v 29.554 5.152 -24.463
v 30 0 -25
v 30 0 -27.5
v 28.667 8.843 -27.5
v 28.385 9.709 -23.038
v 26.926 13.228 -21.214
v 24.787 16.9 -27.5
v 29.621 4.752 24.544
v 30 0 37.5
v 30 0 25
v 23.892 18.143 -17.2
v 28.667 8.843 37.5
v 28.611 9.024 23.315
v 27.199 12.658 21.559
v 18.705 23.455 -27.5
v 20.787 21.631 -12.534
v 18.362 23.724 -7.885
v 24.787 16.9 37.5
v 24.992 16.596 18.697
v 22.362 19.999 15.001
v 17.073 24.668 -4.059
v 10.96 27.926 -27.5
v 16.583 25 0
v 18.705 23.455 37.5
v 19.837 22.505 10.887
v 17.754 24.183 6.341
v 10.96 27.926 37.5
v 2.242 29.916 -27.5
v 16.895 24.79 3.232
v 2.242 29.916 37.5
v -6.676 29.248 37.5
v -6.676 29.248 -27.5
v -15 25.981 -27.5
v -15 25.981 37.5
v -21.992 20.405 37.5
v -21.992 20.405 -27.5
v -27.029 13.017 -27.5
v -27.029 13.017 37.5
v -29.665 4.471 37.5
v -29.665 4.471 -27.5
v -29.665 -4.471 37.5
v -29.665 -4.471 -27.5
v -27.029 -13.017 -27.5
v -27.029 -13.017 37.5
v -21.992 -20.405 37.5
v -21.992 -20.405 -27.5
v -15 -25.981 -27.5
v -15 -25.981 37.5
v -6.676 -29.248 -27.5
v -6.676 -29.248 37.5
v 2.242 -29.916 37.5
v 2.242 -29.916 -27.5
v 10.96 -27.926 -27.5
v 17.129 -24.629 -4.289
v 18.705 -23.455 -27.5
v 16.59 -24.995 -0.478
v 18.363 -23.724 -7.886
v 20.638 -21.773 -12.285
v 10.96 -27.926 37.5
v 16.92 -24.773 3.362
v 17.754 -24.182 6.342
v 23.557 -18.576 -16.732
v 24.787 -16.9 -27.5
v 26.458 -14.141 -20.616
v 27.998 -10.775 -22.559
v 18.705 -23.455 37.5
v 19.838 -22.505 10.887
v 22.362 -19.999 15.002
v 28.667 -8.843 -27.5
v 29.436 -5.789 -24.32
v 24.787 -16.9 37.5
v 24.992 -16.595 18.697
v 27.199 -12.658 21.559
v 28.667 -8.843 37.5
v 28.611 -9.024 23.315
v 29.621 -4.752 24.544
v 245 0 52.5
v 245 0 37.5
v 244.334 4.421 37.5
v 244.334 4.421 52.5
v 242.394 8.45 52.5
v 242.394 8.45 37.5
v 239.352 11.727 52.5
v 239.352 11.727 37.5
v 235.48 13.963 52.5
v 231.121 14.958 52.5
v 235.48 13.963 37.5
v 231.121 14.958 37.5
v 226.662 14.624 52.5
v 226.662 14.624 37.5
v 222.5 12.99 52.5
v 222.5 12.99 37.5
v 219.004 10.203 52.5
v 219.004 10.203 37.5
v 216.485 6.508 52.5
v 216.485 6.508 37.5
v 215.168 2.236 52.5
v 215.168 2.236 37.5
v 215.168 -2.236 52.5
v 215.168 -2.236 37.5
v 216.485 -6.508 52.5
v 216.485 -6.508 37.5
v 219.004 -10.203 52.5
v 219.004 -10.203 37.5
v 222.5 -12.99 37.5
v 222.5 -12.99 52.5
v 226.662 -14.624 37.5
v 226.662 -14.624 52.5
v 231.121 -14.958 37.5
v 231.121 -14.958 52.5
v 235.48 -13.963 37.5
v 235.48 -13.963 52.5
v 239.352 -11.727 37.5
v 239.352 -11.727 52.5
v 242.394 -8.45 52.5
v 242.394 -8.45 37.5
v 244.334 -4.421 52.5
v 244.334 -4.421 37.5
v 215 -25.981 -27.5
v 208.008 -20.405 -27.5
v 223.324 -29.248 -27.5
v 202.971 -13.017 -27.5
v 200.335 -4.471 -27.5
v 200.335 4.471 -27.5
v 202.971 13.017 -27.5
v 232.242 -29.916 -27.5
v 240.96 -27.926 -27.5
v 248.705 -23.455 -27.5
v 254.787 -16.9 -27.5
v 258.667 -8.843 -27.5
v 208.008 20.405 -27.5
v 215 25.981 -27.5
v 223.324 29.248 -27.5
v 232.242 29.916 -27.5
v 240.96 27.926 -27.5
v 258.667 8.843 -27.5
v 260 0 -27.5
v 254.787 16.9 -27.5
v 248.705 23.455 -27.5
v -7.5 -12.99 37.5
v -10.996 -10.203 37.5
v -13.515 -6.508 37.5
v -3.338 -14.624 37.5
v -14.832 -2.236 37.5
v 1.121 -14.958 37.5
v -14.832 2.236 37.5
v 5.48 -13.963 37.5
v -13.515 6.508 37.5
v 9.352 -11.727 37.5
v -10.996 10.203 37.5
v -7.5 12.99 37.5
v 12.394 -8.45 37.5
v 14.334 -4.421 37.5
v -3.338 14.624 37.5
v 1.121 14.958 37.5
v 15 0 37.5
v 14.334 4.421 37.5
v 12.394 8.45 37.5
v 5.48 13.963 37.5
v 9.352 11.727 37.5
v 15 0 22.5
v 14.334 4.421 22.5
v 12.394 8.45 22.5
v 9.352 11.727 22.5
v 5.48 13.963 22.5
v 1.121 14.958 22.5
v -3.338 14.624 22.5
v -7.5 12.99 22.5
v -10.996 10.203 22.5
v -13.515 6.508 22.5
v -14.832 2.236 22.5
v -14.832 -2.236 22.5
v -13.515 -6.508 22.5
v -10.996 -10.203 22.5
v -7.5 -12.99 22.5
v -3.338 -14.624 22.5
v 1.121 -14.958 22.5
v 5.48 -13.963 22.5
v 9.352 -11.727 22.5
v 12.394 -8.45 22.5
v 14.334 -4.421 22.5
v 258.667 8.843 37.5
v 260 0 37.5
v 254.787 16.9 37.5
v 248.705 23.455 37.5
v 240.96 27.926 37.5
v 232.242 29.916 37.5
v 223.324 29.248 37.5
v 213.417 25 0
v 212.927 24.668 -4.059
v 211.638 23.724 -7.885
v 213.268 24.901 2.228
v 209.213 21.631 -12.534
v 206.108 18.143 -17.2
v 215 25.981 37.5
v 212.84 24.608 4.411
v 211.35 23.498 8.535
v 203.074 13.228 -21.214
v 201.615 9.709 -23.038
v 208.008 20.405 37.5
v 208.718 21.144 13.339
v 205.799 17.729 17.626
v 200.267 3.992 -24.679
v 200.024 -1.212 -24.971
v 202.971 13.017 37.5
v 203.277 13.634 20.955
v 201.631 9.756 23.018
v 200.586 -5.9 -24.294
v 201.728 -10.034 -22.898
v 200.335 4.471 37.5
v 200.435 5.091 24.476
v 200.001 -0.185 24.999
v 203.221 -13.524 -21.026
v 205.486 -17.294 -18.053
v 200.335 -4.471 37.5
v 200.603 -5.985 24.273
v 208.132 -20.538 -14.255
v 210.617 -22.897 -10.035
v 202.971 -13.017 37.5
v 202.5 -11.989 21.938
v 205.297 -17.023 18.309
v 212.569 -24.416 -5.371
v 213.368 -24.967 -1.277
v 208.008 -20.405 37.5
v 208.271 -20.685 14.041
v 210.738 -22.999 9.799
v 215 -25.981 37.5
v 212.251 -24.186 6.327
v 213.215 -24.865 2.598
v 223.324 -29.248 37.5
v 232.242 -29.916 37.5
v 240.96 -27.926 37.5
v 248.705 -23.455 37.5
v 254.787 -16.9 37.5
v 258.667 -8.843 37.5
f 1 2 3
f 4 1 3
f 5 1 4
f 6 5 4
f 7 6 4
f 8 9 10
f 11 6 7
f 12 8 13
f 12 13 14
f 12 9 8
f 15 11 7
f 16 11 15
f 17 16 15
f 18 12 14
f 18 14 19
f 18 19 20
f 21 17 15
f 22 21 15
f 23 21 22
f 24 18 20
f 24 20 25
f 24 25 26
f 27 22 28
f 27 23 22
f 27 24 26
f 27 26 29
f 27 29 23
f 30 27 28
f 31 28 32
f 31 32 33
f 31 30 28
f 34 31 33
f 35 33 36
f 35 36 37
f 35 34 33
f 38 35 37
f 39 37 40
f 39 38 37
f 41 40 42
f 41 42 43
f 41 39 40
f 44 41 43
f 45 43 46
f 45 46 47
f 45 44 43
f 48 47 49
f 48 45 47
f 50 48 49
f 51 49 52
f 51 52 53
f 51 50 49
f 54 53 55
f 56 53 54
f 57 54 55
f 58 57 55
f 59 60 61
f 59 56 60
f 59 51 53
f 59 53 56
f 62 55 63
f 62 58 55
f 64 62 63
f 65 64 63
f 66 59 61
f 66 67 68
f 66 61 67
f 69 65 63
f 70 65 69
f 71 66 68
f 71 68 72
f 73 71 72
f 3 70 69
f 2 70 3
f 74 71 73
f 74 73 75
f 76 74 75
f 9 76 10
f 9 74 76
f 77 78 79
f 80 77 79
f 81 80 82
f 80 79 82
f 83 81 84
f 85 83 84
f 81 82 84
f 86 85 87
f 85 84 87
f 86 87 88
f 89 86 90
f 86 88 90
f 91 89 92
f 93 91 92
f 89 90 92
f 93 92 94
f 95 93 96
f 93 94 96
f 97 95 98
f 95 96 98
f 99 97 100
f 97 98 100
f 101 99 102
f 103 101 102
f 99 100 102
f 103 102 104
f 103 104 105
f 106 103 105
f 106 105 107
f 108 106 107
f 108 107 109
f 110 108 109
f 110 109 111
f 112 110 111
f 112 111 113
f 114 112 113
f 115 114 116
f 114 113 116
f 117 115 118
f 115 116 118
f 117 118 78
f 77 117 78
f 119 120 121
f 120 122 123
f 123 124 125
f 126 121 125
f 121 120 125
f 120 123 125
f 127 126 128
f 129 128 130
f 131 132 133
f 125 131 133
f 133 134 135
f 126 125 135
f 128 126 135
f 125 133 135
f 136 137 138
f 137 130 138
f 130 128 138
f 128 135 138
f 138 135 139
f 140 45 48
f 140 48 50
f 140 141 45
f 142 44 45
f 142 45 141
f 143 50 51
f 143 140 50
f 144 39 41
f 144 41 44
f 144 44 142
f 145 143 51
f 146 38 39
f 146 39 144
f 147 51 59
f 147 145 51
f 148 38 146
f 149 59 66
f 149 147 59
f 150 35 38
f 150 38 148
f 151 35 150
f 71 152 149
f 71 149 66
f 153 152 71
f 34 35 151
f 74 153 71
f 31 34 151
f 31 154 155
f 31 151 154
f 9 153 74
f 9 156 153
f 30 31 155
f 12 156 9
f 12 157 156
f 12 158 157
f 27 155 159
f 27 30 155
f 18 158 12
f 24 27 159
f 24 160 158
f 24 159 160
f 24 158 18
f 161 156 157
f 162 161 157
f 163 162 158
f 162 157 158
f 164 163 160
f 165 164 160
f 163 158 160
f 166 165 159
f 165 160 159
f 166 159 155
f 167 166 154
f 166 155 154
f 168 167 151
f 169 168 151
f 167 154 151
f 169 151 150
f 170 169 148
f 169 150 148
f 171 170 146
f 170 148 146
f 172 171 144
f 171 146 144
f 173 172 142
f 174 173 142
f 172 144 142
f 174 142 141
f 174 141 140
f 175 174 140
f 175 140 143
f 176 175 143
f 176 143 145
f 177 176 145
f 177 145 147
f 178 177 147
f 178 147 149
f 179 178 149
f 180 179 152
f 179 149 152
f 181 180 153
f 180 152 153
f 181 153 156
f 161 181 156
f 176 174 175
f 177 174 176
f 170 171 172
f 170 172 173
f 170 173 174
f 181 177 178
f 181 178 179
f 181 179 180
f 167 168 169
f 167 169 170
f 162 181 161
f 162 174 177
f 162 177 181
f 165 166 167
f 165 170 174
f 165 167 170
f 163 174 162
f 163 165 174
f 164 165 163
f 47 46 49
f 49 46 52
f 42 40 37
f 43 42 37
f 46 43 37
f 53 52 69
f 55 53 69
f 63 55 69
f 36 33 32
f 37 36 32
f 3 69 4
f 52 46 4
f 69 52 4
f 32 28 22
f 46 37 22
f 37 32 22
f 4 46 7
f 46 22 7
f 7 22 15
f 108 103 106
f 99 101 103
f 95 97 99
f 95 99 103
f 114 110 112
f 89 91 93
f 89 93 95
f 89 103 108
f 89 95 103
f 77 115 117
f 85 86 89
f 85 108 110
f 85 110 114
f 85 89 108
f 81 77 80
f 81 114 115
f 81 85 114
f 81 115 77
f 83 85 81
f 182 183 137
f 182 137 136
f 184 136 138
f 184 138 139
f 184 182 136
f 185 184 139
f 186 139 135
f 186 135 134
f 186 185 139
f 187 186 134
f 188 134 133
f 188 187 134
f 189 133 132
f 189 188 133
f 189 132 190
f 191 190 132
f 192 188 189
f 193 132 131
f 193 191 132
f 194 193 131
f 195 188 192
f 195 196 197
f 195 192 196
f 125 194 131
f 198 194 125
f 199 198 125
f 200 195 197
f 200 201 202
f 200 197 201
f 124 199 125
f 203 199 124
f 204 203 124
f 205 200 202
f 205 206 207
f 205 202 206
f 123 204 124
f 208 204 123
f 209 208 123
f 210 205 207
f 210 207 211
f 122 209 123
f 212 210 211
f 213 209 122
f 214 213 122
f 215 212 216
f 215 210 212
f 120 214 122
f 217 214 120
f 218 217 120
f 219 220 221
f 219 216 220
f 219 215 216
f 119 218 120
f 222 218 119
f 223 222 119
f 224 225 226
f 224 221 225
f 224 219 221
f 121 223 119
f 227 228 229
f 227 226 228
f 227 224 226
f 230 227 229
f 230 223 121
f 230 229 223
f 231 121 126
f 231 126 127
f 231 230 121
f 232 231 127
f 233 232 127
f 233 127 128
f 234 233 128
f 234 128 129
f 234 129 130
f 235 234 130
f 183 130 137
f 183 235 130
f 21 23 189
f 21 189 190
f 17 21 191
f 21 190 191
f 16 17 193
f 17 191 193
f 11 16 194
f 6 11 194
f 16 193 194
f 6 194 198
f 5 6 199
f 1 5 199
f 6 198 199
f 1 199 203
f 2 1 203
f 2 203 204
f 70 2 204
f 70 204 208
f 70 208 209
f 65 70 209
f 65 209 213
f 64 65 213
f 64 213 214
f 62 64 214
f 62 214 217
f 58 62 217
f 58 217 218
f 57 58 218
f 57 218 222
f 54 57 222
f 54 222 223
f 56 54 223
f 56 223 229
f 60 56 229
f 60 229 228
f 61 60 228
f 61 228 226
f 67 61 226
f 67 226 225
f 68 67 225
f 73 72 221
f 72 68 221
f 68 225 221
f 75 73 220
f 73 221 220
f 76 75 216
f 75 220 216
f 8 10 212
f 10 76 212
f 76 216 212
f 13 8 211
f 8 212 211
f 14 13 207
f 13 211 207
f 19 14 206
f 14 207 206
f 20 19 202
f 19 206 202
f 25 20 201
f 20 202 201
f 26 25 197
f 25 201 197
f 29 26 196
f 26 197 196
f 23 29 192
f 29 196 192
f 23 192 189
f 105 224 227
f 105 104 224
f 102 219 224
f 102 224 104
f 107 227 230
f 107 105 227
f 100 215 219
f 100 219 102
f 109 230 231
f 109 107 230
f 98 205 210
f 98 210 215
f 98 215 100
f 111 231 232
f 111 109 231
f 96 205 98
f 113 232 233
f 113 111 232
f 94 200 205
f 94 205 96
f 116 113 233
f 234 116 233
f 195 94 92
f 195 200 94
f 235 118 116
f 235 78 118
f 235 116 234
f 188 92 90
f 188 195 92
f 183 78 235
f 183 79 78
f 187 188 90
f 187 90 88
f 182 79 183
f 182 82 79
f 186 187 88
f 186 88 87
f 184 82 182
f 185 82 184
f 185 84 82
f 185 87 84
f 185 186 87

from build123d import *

# Parameters (mm, degrees)
BOSS_EXTRUDE1_START   = 5
SKETCH1_R             = 30
BOSS_EXTRUDE1_DEPTH   = 32.5
BOSS_EXTRUDE1_2_DEPTH = 32.5
SKETCH1_3_ONE_SIDE_W  = 196.833752096
SKETCH1_3_ONE_SIDE_H  = 25
CUT_EXTRUDE1_START    = 37.5
SKETCH1_4_R           = 15
CUT_EXTRUDE1_DEPTH    = 15
BOSS_EXTRUDE2_START   = 37.5
SKETCH1_5_R           = 15
BOSS_EXTRUDE2_DEPTH   = 15


with BuildPart() as part:
    # Sketch1 → Boss-Extrude1 (new body, symmetric)
    with BuildSketch(Plane.XY.offset(BOSS_EXTRUDE1_START)):
        Circle(SKETCH1_R)
    extrude(amount=BOSS_EXTRUDE1_DEPTH, both=True)



with BuildPart() as body_2:
    # Sketch1 → Boss-Extrude1 2 (new body, symmetric)
    with BuildSketch(Plane.XY.offset(BOSS_EXTRUDE1_START)):
        with Locations((230, 0)):
            Circle(SKETCH1_R)
    extrude(amount=BOSS_EXTRUDE1_2_DEPTH, both=True)


with BuildPart() as part_1:
    add(part.part)

    add(body_2.part)  # Revolve1 merges body 2
    # Sketch1<3> one side → Revolve1 (revolve)
    with BuildSketch(Plane.XY):
        with Locations((115, 12.5)):
            Rectangle(SKETCH1_3_ONE_SIDE_W, SKETCH1_3_ONE_SIDE_H)
    revolve(axis=Axis((213.416876048, 0, 0), (-1, 0, 0)))

    # Sketch1<4> → Cut-Extrude1 (cut)
    with BuildSketch(Plane.XY.offset(CUT_EXTRUDE1_START)):
        Circle(SKETCH1_4_R)
    extrude(amount=-CUT_EXTRUDE1_DEPTH, mode=Mode.SUBTRACT)

    # Sketch1<5> → Boss-Extrude2 (add)
    with BuildSketch(Plane.XY.offset(BOSS_EXTRUDE2_START)):
        with Locations((230, 0)):
            Circle(SKETCH1_5_R)
    extrude(amount=BOSS_EXTRUDE2_DEPTH)


solid = part_1.part
